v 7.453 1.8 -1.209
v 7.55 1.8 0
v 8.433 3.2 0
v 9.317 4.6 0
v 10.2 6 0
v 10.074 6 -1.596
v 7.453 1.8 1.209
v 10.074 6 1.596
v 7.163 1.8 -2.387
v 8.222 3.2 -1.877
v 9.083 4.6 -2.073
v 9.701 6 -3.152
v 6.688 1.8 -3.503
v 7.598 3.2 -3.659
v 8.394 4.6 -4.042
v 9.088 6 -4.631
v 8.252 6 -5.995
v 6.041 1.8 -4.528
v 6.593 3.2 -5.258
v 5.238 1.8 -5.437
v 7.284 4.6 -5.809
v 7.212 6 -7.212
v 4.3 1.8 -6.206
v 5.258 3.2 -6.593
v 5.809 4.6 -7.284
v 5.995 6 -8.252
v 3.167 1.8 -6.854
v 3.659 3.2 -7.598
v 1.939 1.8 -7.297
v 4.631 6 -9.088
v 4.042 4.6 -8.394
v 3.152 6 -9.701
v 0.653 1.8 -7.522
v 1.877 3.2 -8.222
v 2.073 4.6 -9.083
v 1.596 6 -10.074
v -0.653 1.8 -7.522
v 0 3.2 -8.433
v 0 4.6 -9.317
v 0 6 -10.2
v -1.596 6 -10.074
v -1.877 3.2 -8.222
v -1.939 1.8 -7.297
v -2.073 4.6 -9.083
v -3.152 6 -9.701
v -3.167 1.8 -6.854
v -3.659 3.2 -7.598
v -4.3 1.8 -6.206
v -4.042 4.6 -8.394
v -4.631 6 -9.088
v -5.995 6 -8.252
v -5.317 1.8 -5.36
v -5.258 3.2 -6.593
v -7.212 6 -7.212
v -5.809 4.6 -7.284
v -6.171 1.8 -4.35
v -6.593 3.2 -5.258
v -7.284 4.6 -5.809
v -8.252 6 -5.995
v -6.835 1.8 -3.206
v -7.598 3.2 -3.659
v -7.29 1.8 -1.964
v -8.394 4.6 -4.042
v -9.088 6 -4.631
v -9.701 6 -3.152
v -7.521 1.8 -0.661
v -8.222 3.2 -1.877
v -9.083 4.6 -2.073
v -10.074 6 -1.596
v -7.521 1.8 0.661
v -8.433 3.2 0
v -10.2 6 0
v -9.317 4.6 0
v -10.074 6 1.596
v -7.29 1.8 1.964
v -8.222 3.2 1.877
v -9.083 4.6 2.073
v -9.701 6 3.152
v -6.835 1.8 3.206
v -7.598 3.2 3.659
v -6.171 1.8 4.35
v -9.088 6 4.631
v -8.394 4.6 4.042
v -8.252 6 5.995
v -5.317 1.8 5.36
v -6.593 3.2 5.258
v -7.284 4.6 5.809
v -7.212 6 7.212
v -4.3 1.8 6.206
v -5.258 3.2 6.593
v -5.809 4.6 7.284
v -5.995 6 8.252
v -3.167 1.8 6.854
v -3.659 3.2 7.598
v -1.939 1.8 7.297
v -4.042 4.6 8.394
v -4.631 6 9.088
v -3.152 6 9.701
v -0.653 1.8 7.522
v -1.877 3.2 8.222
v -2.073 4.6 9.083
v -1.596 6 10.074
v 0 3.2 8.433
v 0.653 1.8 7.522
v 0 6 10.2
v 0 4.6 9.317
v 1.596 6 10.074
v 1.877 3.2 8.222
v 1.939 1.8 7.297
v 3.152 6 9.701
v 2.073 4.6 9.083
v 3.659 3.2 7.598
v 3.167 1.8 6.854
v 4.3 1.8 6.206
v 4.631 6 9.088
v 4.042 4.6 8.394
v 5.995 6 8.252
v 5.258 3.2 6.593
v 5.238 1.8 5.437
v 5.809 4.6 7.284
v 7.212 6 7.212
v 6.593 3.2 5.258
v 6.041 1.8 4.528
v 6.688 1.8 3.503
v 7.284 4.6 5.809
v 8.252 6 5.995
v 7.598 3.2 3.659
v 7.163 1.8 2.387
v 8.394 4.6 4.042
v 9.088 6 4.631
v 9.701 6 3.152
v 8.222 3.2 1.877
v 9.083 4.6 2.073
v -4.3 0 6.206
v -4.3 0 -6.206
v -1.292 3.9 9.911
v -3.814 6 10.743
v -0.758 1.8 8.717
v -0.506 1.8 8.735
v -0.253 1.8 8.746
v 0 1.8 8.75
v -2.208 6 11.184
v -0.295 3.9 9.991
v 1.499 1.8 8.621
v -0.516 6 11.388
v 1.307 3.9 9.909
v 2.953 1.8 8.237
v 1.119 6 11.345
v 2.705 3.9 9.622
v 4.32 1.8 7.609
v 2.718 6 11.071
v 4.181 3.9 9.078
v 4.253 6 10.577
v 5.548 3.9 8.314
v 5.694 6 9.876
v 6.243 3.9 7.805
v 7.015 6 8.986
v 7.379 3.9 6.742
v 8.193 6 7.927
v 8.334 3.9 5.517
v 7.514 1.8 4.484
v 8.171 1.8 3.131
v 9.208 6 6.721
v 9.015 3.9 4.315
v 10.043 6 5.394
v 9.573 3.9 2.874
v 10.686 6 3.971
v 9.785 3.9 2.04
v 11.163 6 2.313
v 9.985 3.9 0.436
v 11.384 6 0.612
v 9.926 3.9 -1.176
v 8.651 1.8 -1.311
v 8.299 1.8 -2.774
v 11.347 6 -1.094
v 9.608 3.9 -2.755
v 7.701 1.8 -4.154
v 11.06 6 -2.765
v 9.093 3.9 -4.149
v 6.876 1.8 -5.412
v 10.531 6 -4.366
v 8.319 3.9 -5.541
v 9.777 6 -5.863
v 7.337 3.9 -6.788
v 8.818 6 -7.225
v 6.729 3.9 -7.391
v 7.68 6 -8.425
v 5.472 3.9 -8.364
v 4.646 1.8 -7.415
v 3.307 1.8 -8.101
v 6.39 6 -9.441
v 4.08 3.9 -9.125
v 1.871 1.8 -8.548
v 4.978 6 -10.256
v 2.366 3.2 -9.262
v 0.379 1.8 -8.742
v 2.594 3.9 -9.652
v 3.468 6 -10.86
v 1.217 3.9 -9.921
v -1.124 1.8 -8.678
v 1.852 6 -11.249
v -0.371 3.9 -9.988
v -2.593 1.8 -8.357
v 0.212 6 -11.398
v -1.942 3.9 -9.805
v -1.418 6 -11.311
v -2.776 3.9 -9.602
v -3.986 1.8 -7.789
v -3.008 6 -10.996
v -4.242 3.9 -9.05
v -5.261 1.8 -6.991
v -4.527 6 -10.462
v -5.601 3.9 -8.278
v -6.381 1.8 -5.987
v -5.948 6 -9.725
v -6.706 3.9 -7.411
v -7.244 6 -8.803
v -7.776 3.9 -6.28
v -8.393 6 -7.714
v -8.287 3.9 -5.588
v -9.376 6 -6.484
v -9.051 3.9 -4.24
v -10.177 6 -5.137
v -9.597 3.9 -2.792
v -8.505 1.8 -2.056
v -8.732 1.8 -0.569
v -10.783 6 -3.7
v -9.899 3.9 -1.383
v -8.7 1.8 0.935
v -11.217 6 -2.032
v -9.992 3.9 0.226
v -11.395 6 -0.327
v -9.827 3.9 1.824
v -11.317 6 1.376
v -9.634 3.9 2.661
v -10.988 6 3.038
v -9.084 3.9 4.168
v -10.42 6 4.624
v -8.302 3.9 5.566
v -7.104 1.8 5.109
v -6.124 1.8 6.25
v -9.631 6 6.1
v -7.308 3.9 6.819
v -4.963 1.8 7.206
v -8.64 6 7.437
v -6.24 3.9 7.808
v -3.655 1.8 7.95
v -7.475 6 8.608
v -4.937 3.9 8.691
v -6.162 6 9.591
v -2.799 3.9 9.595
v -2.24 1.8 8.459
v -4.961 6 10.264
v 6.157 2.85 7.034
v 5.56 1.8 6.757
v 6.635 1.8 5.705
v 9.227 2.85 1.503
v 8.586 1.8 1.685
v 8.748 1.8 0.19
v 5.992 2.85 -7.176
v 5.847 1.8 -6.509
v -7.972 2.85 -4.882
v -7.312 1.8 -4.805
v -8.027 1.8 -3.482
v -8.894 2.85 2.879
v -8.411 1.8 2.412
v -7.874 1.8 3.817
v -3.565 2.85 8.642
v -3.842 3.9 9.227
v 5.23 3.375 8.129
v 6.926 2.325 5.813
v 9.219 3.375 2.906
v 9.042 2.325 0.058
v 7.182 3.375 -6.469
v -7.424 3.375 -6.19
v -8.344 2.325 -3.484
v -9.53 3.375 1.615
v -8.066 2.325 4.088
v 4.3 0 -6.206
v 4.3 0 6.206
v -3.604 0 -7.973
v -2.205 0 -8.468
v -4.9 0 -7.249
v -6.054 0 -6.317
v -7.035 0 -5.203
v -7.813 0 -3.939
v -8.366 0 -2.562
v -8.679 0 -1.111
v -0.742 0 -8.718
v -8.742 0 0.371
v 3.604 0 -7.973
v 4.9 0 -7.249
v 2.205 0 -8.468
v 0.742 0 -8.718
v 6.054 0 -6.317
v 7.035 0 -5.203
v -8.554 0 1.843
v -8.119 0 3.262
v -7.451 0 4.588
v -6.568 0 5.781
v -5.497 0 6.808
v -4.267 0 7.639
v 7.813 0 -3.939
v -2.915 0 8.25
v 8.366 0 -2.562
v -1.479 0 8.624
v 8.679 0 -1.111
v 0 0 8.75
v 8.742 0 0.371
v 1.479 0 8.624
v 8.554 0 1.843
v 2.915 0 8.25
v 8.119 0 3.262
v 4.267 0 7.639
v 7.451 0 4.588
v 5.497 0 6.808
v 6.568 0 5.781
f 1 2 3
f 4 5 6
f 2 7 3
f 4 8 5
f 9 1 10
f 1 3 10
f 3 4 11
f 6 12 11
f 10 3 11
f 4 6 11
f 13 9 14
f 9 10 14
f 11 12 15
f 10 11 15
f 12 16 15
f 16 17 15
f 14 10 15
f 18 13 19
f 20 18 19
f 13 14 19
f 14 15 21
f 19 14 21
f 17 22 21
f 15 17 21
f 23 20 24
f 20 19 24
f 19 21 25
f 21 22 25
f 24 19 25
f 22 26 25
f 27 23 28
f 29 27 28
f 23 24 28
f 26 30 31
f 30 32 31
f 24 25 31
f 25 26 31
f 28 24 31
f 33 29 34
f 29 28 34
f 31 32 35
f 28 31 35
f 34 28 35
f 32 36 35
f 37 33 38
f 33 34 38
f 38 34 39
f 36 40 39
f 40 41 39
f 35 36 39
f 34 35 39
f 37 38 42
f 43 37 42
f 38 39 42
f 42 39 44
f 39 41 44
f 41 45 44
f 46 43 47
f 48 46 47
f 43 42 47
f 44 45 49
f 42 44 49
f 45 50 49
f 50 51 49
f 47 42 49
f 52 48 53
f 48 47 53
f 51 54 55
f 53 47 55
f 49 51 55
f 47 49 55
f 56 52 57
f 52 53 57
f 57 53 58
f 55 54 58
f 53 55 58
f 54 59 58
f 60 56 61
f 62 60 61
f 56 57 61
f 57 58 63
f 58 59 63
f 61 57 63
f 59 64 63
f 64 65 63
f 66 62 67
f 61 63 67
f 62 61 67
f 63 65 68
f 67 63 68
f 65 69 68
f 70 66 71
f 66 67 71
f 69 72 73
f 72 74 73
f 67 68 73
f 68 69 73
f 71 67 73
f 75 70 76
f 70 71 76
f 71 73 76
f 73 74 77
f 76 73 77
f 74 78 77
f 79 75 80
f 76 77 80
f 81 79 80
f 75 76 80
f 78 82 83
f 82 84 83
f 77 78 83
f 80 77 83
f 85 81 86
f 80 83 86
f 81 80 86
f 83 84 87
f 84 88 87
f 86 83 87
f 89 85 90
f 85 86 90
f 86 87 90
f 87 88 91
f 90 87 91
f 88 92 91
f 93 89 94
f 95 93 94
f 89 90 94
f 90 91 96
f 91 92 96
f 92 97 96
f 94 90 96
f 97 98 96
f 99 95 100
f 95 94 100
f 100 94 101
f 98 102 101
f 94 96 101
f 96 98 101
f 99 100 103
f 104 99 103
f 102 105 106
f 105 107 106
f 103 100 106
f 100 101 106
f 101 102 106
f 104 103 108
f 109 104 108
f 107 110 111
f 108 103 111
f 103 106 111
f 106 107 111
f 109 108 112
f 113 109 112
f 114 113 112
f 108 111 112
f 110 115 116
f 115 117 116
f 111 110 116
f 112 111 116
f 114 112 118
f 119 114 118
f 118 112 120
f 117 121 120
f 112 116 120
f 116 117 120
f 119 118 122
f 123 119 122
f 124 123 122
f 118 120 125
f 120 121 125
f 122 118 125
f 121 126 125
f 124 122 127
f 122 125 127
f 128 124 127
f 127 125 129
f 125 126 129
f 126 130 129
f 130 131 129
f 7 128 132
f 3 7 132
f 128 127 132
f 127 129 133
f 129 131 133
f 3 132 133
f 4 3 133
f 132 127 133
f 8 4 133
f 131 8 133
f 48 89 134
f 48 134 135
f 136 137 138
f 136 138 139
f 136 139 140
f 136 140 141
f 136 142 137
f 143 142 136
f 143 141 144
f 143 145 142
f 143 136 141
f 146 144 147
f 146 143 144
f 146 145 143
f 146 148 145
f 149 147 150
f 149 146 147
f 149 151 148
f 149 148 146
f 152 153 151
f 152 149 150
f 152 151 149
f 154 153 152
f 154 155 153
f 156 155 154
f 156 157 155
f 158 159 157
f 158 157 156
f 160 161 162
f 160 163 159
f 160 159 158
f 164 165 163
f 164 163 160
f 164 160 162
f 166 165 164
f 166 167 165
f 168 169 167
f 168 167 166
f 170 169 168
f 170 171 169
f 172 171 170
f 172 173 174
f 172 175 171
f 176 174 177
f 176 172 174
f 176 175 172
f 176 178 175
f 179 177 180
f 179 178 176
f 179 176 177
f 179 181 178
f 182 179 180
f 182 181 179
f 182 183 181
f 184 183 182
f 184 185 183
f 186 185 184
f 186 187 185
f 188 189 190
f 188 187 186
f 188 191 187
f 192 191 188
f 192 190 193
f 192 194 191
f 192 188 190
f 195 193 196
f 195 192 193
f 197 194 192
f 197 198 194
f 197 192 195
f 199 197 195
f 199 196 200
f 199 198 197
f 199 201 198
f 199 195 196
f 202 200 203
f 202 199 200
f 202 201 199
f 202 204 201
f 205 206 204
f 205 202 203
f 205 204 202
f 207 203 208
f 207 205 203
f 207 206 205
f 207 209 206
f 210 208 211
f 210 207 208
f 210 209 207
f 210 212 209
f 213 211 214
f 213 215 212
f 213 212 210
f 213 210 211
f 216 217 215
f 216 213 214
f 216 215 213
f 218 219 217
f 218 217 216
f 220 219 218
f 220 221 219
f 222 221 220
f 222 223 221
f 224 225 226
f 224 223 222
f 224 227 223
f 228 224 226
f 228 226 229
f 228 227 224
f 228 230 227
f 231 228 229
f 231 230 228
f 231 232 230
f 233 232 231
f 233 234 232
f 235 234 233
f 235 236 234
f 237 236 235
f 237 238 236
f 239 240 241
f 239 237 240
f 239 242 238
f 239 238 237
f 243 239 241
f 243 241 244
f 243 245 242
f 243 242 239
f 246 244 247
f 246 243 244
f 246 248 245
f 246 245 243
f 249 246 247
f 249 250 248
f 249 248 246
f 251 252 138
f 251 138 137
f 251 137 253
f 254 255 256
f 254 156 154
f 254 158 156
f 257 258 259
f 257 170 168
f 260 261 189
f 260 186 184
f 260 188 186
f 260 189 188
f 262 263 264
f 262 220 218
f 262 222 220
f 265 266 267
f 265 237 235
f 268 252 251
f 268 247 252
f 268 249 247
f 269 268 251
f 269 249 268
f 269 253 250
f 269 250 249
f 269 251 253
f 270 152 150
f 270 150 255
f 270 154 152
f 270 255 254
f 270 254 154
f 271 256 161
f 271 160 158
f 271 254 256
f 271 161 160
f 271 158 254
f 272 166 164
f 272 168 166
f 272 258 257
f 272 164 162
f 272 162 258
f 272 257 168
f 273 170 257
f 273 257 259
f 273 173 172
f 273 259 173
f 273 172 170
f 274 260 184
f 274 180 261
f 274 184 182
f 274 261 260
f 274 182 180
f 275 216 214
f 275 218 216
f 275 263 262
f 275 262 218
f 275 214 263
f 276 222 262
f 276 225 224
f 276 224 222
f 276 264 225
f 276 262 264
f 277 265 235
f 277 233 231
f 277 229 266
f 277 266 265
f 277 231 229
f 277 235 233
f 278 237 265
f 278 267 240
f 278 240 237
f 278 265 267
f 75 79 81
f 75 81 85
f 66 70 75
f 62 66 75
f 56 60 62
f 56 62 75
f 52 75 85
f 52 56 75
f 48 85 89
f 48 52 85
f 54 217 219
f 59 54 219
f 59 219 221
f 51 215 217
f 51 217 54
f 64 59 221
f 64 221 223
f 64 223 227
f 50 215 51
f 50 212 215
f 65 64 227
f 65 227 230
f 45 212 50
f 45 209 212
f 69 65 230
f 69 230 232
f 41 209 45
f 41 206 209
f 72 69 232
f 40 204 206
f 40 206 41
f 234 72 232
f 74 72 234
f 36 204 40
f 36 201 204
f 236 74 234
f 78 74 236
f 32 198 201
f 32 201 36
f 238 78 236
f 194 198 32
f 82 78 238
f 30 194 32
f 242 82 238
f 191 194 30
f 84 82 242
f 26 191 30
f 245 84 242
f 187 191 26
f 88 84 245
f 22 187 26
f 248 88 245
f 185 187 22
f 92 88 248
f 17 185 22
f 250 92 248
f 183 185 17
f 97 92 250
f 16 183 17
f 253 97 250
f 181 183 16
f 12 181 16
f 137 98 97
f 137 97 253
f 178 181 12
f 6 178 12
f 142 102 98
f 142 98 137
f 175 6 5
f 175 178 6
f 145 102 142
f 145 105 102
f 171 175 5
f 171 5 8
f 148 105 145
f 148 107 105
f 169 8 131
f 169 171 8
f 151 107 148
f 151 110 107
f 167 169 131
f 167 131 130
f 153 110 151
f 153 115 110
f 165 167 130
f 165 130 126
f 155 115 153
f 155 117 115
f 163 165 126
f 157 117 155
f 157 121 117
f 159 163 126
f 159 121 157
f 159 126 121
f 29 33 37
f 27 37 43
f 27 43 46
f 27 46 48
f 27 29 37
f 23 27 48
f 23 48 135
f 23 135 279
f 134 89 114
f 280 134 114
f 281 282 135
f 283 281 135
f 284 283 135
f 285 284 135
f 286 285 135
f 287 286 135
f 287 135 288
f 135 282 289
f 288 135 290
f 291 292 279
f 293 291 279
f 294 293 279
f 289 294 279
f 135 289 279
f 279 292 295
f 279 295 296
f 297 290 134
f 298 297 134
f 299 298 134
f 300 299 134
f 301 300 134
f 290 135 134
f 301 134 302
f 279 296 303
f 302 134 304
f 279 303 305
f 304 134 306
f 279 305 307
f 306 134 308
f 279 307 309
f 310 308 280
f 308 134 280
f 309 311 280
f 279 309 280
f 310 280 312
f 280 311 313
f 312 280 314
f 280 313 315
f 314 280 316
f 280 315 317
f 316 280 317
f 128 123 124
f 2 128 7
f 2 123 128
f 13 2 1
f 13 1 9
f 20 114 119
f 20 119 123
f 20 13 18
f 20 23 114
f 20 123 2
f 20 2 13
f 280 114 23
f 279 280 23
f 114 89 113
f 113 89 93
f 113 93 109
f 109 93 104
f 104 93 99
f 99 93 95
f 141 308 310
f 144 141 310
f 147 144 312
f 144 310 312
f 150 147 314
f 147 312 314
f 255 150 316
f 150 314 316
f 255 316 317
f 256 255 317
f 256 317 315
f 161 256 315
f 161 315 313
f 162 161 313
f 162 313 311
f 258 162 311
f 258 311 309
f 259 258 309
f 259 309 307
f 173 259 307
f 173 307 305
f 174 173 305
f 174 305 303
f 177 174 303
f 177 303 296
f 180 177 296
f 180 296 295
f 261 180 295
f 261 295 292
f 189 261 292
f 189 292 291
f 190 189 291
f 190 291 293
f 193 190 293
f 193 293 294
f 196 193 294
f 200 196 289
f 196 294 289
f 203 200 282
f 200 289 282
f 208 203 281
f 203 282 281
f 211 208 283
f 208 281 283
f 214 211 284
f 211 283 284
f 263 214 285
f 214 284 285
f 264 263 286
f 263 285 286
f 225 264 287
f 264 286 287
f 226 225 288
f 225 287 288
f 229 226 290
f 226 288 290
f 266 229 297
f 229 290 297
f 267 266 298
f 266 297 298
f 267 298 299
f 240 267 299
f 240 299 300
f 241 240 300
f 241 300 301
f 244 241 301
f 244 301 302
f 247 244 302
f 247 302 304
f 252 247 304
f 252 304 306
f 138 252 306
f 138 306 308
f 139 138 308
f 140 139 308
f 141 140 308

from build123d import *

# Parameters (mm, degrees)
SKETCH1_R           = 8.75
BOSS_EXTRUDE1_DEPTH = 1.8
SKETCH2_76_R        = 7.55
SKETCH3_51_R        = 10.2
SKETCH4_W           = 8.6
SKETCH4_H           = 12.41168804
CUT_EXTRUDE1_DEPTH  = 17.660132214


with BuildPart() as part:
    # Sketch1 → Boss-Extrude1 (new body)
    with BuildSketch(Plane(origin=(0, 0, 0), x_dir=(1, 0, 0), z_dir=(0, 1, 0))):
        with Locations(Location((0, 0, 0), (0, 0, 270))):
            Circle(SKETCH1_R)
    extrude(amount=BOSS_EXTRUDE1_DEPTH)

    # Loft1: read off the stored shape, not the designer's step
    # Loft1: loft between two sections, ruled curve by curve
    loft1_from = [
        Edge.make_bspline([(-0.757744305, 1.8, 8.717128172), (16.67651204, 1.8, 10.232616781), (18.192000649, 1.8, -7.201639563), (0.757744305, 1.8, -8.717128172), (-16.67651204, 1.8, -10.232616781), (-18.192000649, 1.8, 7.201639563), (-0.757744305, 1.8, 8.717128172)], [0, 0, 0, 0, 0.5, 0.5, 0.5, 1, 1, 1, 1], 3, [1, 0.333333333, 0.333333333, 1, 0.333333333, 0.333333333, 1]),
    ]
    loft1_to = [
        Edge.make_bspline([(-3.814399501, 6, 10.742921225), (17.671442948, 6, 18.371720228), (25.300241951, 6, -3.114122222), (3.814399501, 6, -10.742921225), (-17.671442948, 6, -18.371720228), (-25.300241951, 6, 3.114122222), (-3.814399501, 6, 10.742921225)], [0, 0, 0, 0, 0.5, 0.5, 0.5, 1, 1, 1, 1], 3, [1, 0.333333333, 0.333333333, 1, 0.333333333, 0.333333333, 1]),
    ]
    loft1 = Solid(Shell([*[Face.make_surface_from_curves(loft1_from[k], loft1_to[k]) for k in range(1)], Face(Wire(loft1_from)), Face(Wire(loft1_to))]))
    add(loft1)

    # Sketch2<76> → Cut-Loft1 section 0
    with BuildSketch(Plane(origin=(0, 1.8, 0), x_dir=(1, 0, 0), z_dir=(0, 1, 0))):
        Circle(SKETCH2_76_R)
    # Sketch3<51> → Cut-Loft1 section 1
    with BuildSketch(Plane(origin=(0, 6, 0), x_dir=(1, 0, 0), z_dir=(0, 1, 0))):
        Circle(SKETCH3_51_R)
    loft(mode=Mode.SUBTRACT)

    # Sketch4 → Cut-Extrude1 (cut, through all)
    with BuildSketch(Plane(origin=(0, 1.8, 0), x_dir=(1, 0, 0), z_dir=(0, 1, 0))):
        Rectangle(SKETCH4_W, SKETCH4_H)
    extrude(amount=-CUT_EXTRUDE1_DEPTH, mode=Mode.SUBTRACT)


solid = part.part
